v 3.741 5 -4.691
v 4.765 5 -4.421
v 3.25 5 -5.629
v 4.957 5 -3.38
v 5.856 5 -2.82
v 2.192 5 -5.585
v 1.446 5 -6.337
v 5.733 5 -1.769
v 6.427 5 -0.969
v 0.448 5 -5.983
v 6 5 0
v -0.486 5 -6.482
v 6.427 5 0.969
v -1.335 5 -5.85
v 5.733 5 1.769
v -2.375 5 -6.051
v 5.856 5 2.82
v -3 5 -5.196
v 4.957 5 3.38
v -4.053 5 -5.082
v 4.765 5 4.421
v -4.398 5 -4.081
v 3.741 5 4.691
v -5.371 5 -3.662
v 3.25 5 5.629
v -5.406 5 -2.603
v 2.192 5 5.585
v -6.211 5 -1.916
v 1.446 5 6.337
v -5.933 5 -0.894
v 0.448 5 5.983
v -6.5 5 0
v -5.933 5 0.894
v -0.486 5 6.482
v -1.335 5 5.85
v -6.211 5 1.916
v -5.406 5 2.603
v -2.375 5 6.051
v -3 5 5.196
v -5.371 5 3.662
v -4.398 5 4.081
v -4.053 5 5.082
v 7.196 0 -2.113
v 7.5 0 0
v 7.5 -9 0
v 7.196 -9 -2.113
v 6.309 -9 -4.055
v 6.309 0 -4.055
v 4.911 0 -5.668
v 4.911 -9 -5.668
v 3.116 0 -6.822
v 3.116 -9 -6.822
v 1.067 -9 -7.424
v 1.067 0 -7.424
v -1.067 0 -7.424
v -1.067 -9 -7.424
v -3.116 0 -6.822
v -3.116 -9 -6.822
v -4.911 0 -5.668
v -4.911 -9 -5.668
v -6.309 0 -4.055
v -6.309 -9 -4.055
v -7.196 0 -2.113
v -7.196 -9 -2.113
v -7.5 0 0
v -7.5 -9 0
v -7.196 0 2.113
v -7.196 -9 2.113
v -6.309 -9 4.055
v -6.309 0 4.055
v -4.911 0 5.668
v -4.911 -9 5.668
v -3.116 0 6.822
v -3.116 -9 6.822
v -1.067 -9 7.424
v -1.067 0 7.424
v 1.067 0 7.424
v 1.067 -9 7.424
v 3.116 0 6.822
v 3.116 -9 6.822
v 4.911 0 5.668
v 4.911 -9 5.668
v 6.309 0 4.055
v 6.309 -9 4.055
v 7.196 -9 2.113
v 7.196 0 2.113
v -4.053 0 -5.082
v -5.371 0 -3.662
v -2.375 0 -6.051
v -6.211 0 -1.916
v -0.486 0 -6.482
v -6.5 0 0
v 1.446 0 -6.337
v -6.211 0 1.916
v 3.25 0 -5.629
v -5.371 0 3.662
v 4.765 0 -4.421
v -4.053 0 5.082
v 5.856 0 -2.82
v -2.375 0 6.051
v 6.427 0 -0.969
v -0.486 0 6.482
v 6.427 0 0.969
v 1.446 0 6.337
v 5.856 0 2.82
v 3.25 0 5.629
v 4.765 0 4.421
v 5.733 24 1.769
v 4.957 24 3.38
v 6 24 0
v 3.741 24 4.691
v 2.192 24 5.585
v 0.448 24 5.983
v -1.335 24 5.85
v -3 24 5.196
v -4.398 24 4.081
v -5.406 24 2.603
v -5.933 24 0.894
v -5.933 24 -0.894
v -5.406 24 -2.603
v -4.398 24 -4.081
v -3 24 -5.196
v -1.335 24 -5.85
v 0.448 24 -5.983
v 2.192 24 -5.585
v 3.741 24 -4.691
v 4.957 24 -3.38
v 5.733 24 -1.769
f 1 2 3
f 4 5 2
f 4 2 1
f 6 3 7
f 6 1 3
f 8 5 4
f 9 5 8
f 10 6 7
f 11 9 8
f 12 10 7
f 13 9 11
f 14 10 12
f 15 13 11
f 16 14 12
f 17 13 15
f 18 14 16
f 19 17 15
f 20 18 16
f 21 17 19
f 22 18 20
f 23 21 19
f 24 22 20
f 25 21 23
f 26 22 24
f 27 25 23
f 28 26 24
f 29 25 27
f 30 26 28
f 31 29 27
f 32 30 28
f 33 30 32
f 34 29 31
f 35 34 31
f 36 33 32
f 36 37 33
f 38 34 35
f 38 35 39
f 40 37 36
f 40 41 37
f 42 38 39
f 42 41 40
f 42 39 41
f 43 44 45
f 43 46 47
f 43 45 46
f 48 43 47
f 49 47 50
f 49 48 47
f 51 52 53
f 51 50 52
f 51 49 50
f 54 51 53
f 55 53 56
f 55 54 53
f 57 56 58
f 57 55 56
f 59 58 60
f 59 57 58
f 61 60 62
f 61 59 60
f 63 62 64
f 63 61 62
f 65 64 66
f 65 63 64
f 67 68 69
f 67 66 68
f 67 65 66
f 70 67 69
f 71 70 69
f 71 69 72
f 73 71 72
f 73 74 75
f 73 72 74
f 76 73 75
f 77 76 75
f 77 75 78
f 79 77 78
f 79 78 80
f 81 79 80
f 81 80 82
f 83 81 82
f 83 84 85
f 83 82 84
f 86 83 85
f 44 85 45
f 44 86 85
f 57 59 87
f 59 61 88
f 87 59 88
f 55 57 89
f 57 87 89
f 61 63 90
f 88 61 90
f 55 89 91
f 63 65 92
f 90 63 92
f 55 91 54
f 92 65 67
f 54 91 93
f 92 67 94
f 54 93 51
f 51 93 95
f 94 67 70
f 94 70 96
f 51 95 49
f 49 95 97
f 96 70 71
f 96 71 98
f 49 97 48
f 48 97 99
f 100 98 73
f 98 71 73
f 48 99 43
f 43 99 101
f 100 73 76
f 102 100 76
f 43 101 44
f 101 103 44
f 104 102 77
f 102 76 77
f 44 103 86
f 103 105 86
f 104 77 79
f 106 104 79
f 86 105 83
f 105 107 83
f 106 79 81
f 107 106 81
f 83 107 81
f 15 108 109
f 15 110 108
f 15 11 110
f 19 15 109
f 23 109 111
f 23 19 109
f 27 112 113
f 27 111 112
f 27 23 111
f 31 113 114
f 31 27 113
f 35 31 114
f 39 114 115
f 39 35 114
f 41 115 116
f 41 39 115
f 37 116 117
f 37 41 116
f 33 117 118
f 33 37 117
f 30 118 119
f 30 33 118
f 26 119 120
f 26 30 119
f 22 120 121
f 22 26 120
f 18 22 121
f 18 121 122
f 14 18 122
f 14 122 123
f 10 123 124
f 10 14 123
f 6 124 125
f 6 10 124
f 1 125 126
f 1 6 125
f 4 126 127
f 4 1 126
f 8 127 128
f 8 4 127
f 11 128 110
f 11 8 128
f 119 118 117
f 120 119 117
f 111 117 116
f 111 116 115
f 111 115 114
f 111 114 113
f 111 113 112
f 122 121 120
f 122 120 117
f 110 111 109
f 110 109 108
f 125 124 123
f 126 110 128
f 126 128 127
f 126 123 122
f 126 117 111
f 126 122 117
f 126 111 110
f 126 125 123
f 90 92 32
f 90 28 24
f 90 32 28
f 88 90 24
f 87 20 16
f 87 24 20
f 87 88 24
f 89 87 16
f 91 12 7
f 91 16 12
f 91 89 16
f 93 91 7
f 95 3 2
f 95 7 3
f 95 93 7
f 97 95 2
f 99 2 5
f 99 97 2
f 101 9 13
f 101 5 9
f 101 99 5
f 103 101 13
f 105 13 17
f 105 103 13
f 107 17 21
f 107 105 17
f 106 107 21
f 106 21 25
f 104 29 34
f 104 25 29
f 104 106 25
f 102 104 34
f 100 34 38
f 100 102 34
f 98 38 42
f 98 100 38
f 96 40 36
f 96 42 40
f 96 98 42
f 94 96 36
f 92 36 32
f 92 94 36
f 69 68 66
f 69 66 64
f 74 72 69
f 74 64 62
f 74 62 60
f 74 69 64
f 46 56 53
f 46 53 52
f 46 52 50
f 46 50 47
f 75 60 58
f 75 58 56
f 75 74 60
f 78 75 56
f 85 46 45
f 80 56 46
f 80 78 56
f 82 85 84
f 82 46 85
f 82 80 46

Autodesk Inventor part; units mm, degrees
ref_plane "YZ Plane" through (0, 0, 0) normal (1, 0, 0) x (0, 1, 0)
ref_plane "XZ Plane" through (0, 0, 0) normal (0, 1, 0) x (-1, 0, 0)
sketch "Sketch1" plane through (0, 0, 0) normal (0, 1, 0) x (-1, 0, 0)
  circle A0 centre (0, 0) radius 6.5
  dimension "d0" = 13
extrude "Extrusion1" add sketch "Sketch1" along normal blind 5
sketch "Sketch2" plane through (0, 0, 0) normal (0, -1, 0) x (1, 0, 0)
  circle A0 centre (0, 0) radius 7.5
  dimension "d3" = 15
extrude "Extrusion2" add sketch "Sketch2" along normal blind 9
sketch "Sketch3" plane through (0, 5, 0) normal (0, 1, 0) x (1, 0, 0)
  circle A0 centre (0, 0) radius 6
  dimension "d6" = 12
extrude "Extrusion3" add sketch "Sketch3" along normal blind 19
ref_plane "Work Plane1" through (0, 12.5, 0) normal (0, 1, 0) x (1, 0, 0)
sketch "Sketch4" plane through (0, 12.5, 0) normal (0, 1, 0) x (1, 0, 0)
  circle A0 centre (0, 0) radius 6 projected
  circle A1 centre (0, 0) radius 6 projected
properties part number "plunger" material "ABS Plastic"
